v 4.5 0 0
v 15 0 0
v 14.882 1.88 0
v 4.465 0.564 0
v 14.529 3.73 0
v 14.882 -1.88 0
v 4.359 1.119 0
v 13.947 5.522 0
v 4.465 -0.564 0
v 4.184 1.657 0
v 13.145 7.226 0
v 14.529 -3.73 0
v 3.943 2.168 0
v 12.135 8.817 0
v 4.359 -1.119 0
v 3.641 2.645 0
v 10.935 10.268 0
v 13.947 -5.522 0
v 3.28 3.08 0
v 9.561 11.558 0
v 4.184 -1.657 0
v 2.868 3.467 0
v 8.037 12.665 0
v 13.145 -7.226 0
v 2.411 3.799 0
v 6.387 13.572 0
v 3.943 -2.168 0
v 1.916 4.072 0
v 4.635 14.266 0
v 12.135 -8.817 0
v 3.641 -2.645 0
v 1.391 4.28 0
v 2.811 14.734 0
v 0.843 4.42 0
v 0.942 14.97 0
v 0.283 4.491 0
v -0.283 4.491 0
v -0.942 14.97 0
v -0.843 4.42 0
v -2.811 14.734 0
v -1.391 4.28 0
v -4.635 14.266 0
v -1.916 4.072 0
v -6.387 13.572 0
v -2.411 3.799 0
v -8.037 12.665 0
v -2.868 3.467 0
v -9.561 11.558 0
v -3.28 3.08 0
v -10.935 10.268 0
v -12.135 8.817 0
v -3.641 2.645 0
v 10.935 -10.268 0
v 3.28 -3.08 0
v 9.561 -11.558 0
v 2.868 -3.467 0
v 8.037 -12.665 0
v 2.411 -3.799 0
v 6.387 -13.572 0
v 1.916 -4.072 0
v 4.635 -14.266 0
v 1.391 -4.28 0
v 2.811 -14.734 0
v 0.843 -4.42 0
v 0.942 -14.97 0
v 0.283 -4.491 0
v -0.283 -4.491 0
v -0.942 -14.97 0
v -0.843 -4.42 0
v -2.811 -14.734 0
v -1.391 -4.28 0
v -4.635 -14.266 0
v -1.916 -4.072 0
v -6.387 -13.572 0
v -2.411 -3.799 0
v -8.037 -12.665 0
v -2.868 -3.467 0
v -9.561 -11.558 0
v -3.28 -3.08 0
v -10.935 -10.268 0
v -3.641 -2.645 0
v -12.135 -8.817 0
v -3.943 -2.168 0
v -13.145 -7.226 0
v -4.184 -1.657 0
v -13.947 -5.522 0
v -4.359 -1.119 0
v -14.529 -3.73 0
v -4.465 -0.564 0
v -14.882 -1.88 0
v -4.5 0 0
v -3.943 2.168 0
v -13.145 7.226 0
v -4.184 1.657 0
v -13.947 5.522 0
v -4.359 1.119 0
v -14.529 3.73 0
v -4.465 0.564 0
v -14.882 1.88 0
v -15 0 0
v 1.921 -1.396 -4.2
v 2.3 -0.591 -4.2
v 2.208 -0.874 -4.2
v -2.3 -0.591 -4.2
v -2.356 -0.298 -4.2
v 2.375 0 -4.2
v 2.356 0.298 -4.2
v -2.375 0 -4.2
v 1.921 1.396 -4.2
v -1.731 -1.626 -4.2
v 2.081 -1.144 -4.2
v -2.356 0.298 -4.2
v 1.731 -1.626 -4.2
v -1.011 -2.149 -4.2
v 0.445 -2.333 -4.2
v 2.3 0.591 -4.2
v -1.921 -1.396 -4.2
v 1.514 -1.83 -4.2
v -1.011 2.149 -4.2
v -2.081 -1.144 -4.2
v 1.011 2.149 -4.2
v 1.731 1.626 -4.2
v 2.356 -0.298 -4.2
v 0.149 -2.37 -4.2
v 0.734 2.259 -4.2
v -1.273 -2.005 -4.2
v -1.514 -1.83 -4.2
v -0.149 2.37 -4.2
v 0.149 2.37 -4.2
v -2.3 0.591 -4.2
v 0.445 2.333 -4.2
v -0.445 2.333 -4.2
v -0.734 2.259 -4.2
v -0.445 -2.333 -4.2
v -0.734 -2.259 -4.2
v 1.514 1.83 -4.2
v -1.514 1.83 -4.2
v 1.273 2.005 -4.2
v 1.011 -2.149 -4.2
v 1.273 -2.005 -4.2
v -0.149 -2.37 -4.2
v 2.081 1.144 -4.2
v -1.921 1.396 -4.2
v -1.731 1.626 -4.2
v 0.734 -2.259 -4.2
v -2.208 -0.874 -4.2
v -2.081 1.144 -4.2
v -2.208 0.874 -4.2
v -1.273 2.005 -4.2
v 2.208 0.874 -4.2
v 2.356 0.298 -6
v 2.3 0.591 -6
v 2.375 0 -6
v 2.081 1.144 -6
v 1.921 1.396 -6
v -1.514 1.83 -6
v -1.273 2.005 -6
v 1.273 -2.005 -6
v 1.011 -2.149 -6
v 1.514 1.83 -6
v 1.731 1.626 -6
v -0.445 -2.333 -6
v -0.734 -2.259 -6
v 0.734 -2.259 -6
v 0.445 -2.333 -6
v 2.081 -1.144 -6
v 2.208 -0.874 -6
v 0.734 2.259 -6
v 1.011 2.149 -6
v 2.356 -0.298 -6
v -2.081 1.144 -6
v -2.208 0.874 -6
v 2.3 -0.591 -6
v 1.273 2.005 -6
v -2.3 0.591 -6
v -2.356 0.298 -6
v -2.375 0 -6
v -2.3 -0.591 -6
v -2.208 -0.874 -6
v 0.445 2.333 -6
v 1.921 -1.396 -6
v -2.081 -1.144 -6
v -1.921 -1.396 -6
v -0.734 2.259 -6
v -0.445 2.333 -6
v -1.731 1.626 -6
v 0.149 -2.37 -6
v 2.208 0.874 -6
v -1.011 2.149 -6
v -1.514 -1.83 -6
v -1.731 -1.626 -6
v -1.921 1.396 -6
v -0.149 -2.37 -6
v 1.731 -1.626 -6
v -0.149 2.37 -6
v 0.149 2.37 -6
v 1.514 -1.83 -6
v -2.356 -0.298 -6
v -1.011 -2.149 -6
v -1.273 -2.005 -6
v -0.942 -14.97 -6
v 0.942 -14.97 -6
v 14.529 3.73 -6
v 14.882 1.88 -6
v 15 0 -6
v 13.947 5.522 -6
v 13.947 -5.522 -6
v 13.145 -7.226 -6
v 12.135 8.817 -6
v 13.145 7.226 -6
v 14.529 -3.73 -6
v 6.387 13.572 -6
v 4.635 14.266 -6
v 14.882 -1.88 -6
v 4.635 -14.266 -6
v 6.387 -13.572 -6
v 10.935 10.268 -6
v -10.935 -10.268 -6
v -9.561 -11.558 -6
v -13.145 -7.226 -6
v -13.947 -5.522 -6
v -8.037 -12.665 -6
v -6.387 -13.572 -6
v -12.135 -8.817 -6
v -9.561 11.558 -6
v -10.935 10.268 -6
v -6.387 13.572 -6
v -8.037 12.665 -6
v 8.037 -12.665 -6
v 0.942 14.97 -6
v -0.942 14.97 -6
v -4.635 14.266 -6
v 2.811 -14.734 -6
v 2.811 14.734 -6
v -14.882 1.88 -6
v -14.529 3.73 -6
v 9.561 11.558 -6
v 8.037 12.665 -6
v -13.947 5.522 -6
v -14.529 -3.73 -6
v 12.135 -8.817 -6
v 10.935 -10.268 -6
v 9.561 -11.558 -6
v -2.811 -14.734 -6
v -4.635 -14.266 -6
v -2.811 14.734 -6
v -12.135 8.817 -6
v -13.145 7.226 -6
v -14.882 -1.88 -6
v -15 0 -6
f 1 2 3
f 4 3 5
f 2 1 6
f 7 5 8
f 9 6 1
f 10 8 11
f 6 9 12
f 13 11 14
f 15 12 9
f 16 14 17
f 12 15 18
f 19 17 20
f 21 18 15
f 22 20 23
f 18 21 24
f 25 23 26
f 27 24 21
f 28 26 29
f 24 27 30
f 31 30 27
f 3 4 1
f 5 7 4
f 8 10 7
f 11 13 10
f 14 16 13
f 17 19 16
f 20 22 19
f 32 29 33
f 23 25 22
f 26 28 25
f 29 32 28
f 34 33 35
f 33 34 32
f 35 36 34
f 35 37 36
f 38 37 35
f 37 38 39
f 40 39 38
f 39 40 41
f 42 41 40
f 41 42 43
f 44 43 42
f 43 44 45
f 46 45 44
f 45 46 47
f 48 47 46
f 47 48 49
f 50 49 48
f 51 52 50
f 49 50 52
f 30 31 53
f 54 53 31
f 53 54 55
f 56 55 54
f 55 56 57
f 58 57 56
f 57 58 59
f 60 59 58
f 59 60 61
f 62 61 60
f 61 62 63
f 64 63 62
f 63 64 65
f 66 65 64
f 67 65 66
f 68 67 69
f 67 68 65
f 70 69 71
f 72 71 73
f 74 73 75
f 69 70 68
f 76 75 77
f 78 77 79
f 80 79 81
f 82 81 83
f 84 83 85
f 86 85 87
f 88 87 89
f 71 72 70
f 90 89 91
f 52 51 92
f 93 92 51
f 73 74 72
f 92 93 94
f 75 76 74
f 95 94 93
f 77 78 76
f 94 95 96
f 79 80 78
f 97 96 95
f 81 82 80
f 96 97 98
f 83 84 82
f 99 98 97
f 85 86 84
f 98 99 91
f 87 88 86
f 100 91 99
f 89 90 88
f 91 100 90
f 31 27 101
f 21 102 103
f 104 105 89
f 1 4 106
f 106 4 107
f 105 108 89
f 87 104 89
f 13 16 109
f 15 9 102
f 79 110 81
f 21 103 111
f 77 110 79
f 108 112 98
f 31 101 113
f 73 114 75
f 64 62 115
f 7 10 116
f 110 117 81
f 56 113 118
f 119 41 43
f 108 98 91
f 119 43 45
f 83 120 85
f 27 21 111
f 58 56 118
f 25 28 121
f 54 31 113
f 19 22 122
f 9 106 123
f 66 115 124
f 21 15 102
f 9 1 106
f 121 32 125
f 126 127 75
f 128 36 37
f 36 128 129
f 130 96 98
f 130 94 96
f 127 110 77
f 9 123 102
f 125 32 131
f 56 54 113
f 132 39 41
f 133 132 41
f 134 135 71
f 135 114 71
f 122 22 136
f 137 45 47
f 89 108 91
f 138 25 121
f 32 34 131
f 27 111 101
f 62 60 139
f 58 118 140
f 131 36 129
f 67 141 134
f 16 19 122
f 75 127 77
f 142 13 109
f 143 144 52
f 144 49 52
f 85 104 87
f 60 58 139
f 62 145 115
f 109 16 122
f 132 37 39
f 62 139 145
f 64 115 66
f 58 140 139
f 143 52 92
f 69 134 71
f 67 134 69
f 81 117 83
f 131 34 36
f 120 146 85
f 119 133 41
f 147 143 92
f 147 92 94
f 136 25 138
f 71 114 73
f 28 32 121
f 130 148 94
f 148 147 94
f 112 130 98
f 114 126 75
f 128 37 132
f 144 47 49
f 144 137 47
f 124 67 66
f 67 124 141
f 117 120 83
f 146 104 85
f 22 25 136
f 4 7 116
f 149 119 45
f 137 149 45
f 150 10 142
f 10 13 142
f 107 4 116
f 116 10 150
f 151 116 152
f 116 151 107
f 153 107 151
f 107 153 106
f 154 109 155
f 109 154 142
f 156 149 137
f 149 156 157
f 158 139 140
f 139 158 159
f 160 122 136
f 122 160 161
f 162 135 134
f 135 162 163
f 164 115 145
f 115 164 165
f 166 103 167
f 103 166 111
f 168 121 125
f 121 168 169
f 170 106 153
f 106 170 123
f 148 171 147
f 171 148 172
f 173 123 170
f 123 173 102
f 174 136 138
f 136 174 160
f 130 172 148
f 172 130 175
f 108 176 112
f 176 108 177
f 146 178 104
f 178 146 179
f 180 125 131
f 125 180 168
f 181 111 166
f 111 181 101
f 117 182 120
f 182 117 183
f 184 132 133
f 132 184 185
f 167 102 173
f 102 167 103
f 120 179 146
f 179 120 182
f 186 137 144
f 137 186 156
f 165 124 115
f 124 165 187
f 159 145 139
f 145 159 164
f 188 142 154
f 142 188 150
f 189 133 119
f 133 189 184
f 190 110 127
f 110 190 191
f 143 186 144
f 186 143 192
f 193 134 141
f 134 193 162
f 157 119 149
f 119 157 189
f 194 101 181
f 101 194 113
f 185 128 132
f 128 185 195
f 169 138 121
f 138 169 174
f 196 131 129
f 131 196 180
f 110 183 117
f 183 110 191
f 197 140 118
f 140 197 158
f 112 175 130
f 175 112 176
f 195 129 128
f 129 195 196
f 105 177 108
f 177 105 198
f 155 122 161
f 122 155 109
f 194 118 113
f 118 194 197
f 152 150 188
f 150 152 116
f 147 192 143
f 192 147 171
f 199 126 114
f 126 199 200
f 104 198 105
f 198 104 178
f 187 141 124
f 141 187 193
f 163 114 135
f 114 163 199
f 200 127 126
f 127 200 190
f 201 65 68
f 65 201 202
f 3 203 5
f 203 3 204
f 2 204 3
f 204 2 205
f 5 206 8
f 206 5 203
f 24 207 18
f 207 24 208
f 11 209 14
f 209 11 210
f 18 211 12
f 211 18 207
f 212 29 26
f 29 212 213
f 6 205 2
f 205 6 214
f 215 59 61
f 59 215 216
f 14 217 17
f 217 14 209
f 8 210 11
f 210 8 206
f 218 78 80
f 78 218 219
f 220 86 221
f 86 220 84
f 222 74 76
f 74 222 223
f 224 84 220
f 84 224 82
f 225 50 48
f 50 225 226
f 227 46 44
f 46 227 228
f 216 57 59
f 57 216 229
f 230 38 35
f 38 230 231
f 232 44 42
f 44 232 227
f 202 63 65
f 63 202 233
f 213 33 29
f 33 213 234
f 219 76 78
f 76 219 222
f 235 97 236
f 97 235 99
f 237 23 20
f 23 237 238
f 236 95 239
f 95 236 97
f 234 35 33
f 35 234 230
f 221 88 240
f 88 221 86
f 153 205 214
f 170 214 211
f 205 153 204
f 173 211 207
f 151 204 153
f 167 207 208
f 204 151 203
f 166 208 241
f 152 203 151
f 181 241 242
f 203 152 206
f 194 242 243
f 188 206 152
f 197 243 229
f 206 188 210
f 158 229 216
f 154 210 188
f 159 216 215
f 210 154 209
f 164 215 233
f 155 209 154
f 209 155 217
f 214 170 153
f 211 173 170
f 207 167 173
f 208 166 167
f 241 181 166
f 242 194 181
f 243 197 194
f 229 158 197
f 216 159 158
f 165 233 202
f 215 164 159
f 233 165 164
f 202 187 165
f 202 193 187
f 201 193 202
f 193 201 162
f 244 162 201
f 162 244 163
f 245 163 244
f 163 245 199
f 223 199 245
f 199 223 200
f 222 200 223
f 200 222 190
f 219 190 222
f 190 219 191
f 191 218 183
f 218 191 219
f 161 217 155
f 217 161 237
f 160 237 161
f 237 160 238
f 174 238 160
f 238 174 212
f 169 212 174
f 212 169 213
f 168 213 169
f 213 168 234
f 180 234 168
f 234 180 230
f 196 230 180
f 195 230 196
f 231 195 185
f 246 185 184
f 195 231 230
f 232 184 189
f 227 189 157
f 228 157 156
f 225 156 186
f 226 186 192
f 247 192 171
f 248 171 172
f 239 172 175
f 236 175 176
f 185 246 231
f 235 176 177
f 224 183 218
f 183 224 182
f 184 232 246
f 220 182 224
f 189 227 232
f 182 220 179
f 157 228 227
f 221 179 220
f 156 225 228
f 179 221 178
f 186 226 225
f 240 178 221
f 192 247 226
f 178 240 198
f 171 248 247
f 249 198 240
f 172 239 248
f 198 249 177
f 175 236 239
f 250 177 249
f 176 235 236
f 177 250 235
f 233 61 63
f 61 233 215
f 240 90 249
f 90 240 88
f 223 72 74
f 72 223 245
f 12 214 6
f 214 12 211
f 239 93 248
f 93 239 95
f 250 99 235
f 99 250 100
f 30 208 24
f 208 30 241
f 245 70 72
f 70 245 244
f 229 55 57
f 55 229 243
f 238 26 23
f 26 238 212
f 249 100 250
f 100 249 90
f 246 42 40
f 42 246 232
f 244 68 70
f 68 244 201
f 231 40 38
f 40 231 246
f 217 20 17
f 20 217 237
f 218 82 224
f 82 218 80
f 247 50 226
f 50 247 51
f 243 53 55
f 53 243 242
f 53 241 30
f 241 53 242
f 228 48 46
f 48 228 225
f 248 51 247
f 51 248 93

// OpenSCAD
$fn = 50;

difference() {
	union() {
		translate(v = [0, 0, -6.0]) {
			cylinder(h = 6, r = 15.0);
		}
	}
	union() {
		translate(v = [0, 0, 0]) {
			rotate(a = [0, 0, 0]) {
				difference() {
					union() {
						translate(v = [0, 0, -9.0]) {
							cylinder(h = 9, r = 2.25);
						}
						translate(v = [0, 0, -4.2]) {
							cylinder(h = 4.2, r1 = 2.375, r2 = 4.5);
						}
						translate(v = [0, 0, -9.0]) {
							cylinder(h = 9, r = 2.375);
						}
						translate(v = [0, 0, -9.0]) {
							cylinder(h = 9, r = 2.25);
						}
					}
					union();
				}
			}
		}
	}
}
